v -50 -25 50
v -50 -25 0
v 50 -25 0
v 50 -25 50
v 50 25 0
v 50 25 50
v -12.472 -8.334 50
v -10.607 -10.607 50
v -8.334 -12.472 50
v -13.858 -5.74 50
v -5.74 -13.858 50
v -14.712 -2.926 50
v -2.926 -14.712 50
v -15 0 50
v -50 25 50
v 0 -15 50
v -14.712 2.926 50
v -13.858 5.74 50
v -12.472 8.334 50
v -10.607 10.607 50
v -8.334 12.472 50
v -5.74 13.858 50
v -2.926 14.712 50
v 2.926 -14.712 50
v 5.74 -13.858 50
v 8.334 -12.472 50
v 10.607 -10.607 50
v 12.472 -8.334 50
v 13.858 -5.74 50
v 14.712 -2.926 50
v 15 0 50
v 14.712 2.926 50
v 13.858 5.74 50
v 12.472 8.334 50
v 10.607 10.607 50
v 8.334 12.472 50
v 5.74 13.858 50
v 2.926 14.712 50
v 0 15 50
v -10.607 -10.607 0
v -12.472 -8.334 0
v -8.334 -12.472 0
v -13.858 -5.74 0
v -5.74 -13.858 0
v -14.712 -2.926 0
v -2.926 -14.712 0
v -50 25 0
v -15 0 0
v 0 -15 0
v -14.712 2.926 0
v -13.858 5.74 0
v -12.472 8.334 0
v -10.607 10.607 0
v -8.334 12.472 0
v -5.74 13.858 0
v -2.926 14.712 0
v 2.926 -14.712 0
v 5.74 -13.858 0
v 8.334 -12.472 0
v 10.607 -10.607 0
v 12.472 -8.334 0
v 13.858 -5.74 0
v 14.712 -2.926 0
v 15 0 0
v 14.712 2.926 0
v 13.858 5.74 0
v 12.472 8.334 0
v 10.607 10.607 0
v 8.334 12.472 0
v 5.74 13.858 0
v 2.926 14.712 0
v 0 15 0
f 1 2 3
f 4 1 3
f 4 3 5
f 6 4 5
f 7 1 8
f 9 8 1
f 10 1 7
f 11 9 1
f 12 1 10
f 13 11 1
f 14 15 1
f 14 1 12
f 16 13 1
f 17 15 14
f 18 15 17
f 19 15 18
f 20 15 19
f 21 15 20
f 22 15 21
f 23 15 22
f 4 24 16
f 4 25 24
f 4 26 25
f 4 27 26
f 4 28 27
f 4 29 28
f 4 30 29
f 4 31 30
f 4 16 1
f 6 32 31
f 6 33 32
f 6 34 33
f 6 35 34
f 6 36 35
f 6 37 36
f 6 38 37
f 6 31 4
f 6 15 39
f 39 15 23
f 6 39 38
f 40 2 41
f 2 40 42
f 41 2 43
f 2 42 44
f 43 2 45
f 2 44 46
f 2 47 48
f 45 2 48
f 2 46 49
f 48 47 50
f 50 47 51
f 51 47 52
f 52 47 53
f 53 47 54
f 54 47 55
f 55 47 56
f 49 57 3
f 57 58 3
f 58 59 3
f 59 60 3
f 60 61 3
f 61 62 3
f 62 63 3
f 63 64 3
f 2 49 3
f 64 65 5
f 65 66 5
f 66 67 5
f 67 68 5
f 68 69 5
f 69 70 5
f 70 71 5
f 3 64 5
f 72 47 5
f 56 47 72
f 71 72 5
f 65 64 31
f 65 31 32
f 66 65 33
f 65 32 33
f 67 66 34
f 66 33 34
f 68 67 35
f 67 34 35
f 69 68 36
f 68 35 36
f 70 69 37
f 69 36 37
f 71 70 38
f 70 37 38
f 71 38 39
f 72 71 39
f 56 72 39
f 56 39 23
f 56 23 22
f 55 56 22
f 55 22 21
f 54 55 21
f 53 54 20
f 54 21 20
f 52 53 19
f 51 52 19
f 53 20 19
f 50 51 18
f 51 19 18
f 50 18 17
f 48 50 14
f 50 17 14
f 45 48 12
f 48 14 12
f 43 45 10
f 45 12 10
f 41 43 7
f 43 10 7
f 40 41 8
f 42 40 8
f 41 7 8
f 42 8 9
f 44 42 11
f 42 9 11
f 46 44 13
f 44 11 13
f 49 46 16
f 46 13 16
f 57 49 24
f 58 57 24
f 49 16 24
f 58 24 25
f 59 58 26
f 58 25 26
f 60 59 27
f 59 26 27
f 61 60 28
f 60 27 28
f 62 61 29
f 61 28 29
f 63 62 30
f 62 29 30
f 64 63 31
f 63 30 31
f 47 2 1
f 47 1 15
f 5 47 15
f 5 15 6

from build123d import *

# Parameters (mm, degrees)
F0_W     = 100
F0_H     = 50
F1_DEPTH = 50
F2_R     = 15
F3_DEPTH = 50
F4_DEPTH = 50


with BuildPart() as f1:
    # F0 (on Top) → F1 (new body)
    with BuildSketch(Plane.XY):
        Rectangle(F0_W, F0_H)
    extrude(amount=F1_DEPTH)

    # F2 (on face) → F3 (cut)
    with BuildSketch(Plane.XY.offset(50)):
        Circle(F2_R)
    extrude(amount=F3_DEPTH, mode=Mode.SUBTRACT)

    # F2 (on face) → F4 (cut)
    with BuildSketch(Plane.XY.offset(50)):
        Circle(F2_R)
    extrude(amount=-F4_DEPTH, mode=Mode.SUBTRACT)


solid = f1.part
